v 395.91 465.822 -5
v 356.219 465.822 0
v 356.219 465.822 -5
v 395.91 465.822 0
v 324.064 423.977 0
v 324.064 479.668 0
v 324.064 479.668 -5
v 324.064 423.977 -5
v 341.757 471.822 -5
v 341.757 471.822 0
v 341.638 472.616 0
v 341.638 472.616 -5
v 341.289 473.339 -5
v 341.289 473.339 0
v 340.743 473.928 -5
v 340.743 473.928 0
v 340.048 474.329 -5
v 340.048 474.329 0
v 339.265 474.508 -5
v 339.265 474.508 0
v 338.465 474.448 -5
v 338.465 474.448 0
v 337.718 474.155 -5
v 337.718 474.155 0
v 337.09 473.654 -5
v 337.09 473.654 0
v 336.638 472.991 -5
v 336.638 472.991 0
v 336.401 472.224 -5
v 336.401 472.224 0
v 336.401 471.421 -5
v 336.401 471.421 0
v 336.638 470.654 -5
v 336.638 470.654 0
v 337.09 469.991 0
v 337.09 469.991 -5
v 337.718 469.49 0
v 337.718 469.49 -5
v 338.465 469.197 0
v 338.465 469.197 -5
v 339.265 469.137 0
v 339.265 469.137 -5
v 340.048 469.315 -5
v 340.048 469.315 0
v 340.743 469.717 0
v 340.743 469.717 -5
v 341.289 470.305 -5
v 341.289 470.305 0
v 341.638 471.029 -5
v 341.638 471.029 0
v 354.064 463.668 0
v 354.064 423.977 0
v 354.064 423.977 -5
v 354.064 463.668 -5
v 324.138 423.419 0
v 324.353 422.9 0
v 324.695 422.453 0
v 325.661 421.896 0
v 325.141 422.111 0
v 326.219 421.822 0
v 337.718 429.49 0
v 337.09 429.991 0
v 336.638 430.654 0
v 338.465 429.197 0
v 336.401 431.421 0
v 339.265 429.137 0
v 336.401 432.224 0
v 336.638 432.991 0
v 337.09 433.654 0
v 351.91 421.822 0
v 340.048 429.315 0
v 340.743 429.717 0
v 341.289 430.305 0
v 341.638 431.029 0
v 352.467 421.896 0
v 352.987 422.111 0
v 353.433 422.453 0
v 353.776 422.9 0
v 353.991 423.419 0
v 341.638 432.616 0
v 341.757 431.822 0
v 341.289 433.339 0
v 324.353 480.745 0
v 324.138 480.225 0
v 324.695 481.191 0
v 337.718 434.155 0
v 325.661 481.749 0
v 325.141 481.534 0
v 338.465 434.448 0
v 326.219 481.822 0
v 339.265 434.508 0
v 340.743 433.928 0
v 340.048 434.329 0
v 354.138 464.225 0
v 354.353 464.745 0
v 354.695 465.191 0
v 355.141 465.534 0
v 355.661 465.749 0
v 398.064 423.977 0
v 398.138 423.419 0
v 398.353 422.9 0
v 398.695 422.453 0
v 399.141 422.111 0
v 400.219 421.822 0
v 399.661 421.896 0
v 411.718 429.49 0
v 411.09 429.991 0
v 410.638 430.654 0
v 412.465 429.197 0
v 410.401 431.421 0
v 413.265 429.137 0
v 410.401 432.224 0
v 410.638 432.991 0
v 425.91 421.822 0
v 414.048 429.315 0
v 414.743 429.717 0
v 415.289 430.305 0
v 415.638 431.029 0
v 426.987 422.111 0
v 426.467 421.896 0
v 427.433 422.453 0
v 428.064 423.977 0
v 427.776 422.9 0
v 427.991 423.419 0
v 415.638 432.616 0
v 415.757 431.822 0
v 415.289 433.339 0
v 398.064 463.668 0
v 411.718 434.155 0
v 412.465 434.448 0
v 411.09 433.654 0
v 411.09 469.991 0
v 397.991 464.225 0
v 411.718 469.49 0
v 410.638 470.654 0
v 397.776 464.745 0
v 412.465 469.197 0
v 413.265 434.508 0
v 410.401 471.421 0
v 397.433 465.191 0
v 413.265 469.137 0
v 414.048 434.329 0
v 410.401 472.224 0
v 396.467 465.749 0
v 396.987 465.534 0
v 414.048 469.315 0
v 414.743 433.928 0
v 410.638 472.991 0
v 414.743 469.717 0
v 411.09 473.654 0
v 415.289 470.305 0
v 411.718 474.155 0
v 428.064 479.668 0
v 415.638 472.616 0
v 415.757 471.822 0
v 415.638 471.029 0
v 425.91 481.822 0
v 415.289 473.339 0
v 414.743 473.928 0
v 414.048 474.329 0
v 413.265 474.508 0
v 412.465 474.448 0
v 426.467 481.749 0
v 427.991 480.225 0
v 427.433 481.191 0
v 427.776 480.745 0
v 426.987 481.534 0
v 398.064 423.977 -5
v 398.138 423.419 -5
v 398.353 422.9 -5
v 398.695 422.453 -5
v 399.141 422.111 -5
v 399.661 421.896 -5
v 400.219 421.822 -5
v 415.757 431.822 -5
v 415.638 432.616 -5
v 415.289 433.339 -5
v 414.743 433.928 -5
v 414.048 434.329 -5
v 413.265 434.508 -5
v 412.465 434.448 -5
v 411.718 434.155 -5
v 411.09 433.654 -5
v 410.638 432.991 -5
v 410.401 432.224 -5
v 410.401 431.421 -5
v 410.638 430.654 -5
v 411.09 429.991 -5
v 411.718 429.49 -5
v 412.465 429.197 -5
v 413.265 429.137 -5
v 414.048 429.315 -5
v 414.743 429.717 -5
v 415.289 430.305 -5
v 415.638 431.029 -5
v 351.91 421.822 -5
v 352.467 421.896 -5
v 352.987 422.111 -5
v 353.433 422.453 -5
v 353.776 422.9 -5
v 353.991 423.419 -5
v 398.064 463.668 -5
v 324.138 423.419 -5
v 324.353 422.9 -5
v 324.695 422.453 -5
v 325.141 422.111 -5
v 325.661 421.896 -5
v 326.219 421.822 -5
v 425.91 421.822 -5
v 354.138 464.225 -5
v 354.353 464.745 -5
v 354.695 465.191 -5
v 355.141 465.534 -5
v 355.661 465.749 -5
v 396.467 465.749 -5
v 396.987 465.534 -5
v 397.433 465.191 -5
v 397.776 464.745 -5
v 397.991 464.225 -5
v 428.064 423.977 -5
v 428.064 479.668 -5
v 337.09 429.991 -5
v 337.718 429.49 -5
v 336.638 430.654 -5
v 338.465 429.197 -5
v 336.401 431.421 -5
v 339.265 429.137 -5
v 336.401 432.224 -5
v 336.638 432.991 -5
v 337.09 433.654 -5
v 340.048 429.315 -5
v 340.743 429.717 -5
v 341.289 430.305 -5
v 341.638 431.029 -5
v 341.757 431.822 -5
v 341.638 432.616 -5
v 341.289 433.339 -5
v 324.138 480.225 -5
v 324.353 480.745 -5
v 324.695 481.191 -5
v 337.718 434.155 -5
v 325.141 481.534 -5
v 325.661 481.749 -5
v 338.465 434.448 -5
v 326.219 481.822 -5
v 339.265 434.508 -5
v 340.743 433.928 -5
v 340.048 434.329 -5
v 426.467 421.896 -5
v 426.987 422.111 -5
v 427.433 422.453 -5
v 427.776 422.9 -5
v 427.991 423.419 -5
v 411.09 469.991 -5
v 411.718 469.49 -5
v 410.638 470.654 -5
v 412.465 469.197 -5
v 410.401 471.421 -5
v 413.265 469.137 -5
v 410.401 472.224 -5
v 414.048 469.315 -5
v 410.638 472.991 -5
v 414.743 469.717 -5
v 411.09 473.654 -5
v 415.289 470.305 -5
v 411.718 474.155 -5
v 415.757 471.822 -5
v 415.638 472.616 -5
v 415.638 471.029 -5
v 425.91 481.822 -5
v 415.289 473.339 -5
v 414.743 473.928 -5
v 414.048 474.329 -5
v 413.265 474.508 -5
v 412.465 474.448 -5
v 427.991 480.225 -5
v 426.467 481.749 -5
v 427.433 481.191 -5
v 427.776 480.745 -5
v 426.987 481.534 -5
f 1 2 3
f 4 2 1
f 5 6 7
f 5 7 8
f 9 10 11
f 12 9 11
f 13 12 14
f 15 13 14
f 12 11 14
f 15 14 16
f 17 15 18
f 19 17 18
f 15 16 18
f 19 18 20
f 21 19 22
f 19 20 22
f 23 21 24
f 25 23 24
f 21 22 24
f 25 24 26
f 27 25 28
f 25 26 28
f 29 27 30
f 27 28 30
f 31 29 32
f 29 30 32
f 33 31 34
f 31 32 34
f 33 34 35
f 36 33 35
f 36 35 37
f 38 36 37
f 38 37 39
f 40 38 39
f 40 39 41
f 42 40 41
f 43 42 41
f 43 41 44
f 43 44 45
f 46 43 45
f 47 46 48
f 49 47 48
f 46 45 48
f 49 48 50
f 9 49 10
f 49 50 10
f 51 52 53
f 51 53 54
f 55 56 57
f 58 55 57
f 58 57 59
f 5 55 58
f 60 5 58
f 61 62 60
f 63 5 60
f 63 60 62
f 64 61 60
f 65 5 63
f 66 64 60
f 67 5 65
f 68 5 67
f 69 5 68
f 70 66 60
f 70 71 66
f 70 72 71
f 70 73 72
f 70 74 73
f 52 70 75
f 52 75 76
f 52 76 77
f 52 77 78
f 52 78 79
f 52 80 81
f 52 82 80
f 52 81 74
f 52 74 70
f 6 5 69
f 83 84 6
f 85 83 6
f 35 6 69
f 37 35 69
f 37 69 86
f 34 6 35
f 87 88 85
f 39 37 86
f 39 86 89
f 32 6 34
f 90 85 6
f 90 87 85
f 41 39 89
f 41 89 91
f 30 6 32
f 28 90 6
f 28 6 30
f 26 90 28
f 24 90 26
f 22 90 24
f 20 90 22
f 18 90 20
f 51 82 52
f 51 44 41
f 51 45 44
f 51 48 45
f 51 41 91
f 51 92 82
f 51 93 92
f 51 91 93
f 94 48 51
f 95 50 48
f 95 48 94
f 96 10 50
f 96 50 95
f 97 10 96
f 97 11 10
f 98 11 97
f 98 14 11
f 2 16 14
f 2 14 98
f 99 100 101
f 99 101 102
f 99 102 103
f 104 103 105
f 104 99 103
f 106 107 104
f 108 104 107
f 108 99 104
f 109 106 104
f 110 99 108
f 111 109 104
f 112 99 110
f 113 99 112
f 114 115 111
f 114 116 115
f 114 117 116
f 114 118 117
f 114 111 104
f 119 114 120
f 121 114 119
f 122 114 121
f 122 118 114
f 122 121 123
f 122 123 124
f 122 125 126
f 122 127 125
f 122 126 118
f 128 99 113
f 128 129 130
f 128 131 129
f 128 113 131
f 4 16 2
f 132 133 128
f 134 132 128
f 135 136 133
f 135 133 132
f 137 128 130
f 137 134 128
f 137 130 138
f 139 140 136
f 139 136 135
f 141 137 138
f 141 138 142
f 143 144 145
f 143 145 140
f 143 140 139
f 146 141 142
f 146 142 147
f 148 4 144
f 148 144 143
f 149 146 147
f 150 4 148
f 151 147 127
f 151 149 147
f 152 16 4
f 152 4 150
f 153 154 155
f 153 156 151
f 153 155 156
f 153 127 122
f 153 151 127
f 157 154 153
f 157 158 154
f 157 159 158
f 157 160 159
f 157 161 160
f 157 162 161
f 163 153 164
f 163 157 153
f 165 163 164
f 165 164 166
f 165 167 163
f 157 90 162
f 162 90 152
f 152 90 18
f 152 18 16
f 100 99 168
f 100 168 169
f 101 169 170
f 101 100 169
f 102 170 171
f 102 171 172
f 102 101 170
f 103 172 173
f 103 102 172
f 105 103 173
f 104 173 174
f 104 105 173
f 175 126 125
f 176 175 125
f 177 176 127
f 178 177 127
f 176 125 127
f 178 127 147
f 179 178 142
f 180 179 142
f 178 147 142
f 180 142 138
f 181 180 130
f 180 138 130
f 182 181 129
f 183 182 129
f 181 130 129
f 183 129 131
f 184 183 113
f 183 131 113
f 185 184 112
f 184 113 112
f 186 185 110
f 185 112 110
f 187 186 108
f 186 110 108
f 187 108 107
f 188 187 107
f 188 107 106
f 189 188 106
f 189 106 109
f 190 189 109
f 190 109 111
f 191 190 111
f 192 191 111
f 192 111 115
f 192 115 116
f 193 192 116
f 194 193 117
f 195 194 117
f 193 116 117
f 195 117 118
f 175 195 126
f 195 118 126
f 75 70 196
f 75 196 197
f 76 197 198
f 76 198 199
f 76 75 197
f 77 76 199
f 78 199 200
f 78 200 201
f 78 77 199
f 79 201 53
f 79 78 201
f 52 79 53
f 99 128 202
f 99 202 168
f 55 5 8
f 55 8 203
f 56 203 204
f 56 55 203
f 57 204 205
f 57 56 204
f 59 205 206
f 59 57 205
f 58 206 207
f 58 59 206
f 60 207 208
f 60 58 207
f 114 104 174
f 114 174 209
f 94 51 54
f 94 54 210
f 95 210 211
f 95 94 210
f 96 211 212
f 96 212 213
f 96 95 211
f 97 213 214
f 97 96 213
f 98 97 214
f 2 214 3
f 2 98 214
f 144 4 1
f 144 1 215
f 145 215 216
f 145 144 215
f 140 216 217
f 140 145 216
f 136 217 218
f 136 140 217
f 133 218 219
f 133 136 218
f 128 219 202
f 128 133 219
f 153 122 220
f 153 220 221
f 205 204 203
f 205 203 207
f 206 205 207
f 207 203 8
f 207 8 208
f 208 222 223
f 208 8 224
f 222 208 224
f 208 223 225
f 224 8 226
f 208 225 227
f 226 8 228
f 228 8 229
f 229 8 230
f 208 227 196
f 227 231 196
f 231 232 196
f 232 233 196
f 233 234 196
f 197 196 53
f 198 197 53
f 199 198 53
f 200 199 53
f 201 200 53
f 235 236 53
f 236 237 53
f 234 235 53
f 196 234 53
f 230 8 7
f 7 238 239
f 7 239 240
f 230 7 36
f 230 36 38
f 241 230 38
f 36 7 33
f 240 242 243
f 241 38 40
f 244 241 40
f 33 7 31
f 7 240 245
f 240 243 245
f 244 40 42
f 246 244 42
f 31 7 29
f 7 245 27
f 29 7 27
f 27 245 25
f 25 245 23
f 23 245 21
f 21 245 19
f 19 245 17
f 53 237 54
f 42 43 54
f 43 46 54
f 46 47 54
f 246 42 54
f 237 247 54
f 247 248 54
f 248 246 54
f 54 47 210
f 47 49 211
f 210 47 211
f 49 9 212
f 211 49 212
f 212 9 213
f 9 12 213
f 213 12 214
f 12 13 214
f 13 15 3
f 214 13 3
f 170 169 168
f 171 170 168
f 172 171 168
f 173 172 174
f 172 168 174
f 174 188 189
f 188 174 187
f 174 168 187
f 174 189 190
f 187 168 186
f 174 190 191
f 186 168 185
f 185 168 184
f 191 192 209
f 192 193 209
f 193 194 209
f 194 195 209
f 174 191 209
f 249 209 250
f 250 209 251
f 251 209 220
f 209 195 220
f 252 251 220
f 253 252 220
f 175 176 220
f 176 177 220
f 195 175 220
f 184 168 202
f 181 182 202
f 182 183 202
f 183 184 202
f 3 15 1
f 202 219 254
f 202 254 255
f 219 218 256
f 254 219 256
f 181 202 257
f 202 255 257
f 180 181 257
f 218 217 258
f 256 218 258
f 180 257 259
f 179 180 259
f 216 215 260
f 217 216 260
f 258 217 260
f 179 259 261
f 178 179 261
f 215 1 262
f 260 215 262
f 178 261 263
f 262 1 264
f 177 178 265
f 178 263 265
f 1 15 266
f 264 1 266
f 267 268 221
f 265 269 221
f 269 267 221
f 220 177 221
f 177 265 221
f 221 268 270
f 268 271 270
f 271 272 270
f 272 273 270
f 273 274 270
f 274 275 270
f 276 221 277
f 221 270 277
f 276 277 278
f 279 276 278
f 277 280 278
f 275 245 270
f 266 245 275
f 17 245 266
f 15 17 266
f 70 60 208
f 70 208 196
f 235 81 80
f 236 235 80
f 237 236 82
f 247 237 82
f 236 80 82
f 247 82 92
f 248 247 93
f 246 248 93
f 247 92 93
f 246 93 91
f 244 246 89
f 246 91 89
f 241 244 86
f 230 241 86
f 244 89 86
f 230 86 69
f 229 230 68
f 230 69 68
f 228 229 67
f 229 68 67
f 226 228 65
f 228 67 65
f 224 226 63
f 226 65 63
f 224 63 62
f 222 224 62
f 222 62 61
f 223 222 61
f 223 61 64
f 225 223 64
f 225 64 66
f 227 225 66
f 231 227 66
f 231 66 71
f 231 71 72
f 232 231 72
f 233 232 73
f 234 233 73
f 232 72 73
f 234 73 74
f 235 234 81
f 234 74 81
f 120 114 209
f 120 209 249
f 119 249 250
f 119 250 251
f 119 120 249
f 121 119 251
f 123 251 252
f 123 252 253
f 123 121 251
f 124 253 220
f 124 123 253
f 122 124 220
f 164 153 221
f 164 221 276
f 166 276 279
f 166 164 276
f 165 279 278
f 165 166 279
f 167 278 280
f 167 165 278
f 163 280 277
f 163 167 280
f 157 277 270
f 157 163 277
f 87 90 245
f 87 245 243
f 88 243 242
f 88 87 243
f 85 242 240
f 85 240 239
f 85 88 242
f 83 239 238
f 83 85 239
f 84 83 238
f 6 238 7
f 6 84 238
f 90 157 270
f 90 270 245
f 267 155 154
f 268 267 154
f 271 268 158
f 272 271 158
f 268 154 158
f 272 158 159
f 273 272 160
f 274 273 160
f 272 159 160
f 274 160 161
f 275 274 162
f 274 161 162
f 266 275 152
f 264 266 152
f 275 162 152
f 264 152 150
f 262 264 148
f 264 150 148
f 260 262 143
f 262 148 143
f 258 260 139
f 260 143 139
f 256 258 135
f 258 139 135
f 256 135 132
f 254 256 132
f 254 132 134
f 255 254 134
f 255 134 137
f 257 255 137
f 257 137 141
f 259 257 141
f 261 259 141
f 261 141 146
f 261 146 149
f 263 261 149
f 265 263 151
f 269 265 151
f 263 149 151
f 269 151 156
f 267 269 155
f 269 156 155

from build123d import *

# Parameters (mm, degrees)
SKETCH1_R           = 2.693094888
BOSS_EXTRUDE1_DEPTH = 5


with BuildPart() as part:
    # Sketch1 → Boss-Extrude1 (new body)
    with BuildSketch(Plane.XY):
        with BuildLine():
            Line((326.218649089, 421.822340311), (351.909697268, 421.822340311))
            ThreePointArc((351.909697268, 421.822340311), (353.433141794, 422.453371695), (354.064173178, 423.976816221))
            Line((354.064173178, 423.976816221), (354.064173178, 463.6678644))
            ThreePointArc((354.064173178, 463.6678644), (354.695204563, 465.191308926), (356.218649089, 465.822340311))
            Line((356.218649089, 465.822340311), (395.909699459, 465.822340311))
            ThreePointArc((395.909699459, 465.822340311), (397.433143985, 465.191308926), (398.064175369, 463.6678644))
            Line((398.064175369, 463.6678644), (398.064175369, 423.976816221))
            ThreePointArc((398.064175369, 423.976816221), (398.695206753, 422.453371695), (400.218651279, 421.822340311))
            Line((400.218651279, 421.822340311), (425.909697268, 421.822340311))
            ThreePointArc((425.909697268, 421.822340311), (427.433141794, 422.453371695), (428.064173178, 423.976816221))
            Line((428.064173178, 423.976816221), (428.064173178, 479.6678644))
            ThreePointArc((428.064173178, 479.6678644), (427.433141794, 481.191308926), (425.909697268, 481.822340311))
            Line((425.909697268, 481.822340311), (326.218649089, 481.822340311))
            ThreePointArc((326.218649089, 481.822340311), (324.695204563, 481.191308926), (324.064173178, 479.6678644))
            Line((324.064173178, 479.6678644), (324.064173178, 423.976816221))
            ThreePointArc((324.064173178, 423.976816221), (324.695204563, 422.453371695), (326.218649089, 421.822340311))
        make_face()
        with Locations((339.064173178, 471.822340311)):
            Circle(SKETCH1_R, mode=Mode.SUBTRACT)
        with Locations((339.064173178, 431.822340311)):
            Circle(SKETCH1_R, mode=Mode.SUBTRACT)
        with Locations((413.064174274, 431.822340311)):
            Circle(SKETCH1_R, mode=Mode.SUBTRACT)
        with Locations((413.064174274, 471.822340311)):
            Circle(SKETCH1_R, mode=Mode.SUBTRACT)
    extrude(amount=-BOSS_EXTRUDE1_DEPTH)


solid = part.part
